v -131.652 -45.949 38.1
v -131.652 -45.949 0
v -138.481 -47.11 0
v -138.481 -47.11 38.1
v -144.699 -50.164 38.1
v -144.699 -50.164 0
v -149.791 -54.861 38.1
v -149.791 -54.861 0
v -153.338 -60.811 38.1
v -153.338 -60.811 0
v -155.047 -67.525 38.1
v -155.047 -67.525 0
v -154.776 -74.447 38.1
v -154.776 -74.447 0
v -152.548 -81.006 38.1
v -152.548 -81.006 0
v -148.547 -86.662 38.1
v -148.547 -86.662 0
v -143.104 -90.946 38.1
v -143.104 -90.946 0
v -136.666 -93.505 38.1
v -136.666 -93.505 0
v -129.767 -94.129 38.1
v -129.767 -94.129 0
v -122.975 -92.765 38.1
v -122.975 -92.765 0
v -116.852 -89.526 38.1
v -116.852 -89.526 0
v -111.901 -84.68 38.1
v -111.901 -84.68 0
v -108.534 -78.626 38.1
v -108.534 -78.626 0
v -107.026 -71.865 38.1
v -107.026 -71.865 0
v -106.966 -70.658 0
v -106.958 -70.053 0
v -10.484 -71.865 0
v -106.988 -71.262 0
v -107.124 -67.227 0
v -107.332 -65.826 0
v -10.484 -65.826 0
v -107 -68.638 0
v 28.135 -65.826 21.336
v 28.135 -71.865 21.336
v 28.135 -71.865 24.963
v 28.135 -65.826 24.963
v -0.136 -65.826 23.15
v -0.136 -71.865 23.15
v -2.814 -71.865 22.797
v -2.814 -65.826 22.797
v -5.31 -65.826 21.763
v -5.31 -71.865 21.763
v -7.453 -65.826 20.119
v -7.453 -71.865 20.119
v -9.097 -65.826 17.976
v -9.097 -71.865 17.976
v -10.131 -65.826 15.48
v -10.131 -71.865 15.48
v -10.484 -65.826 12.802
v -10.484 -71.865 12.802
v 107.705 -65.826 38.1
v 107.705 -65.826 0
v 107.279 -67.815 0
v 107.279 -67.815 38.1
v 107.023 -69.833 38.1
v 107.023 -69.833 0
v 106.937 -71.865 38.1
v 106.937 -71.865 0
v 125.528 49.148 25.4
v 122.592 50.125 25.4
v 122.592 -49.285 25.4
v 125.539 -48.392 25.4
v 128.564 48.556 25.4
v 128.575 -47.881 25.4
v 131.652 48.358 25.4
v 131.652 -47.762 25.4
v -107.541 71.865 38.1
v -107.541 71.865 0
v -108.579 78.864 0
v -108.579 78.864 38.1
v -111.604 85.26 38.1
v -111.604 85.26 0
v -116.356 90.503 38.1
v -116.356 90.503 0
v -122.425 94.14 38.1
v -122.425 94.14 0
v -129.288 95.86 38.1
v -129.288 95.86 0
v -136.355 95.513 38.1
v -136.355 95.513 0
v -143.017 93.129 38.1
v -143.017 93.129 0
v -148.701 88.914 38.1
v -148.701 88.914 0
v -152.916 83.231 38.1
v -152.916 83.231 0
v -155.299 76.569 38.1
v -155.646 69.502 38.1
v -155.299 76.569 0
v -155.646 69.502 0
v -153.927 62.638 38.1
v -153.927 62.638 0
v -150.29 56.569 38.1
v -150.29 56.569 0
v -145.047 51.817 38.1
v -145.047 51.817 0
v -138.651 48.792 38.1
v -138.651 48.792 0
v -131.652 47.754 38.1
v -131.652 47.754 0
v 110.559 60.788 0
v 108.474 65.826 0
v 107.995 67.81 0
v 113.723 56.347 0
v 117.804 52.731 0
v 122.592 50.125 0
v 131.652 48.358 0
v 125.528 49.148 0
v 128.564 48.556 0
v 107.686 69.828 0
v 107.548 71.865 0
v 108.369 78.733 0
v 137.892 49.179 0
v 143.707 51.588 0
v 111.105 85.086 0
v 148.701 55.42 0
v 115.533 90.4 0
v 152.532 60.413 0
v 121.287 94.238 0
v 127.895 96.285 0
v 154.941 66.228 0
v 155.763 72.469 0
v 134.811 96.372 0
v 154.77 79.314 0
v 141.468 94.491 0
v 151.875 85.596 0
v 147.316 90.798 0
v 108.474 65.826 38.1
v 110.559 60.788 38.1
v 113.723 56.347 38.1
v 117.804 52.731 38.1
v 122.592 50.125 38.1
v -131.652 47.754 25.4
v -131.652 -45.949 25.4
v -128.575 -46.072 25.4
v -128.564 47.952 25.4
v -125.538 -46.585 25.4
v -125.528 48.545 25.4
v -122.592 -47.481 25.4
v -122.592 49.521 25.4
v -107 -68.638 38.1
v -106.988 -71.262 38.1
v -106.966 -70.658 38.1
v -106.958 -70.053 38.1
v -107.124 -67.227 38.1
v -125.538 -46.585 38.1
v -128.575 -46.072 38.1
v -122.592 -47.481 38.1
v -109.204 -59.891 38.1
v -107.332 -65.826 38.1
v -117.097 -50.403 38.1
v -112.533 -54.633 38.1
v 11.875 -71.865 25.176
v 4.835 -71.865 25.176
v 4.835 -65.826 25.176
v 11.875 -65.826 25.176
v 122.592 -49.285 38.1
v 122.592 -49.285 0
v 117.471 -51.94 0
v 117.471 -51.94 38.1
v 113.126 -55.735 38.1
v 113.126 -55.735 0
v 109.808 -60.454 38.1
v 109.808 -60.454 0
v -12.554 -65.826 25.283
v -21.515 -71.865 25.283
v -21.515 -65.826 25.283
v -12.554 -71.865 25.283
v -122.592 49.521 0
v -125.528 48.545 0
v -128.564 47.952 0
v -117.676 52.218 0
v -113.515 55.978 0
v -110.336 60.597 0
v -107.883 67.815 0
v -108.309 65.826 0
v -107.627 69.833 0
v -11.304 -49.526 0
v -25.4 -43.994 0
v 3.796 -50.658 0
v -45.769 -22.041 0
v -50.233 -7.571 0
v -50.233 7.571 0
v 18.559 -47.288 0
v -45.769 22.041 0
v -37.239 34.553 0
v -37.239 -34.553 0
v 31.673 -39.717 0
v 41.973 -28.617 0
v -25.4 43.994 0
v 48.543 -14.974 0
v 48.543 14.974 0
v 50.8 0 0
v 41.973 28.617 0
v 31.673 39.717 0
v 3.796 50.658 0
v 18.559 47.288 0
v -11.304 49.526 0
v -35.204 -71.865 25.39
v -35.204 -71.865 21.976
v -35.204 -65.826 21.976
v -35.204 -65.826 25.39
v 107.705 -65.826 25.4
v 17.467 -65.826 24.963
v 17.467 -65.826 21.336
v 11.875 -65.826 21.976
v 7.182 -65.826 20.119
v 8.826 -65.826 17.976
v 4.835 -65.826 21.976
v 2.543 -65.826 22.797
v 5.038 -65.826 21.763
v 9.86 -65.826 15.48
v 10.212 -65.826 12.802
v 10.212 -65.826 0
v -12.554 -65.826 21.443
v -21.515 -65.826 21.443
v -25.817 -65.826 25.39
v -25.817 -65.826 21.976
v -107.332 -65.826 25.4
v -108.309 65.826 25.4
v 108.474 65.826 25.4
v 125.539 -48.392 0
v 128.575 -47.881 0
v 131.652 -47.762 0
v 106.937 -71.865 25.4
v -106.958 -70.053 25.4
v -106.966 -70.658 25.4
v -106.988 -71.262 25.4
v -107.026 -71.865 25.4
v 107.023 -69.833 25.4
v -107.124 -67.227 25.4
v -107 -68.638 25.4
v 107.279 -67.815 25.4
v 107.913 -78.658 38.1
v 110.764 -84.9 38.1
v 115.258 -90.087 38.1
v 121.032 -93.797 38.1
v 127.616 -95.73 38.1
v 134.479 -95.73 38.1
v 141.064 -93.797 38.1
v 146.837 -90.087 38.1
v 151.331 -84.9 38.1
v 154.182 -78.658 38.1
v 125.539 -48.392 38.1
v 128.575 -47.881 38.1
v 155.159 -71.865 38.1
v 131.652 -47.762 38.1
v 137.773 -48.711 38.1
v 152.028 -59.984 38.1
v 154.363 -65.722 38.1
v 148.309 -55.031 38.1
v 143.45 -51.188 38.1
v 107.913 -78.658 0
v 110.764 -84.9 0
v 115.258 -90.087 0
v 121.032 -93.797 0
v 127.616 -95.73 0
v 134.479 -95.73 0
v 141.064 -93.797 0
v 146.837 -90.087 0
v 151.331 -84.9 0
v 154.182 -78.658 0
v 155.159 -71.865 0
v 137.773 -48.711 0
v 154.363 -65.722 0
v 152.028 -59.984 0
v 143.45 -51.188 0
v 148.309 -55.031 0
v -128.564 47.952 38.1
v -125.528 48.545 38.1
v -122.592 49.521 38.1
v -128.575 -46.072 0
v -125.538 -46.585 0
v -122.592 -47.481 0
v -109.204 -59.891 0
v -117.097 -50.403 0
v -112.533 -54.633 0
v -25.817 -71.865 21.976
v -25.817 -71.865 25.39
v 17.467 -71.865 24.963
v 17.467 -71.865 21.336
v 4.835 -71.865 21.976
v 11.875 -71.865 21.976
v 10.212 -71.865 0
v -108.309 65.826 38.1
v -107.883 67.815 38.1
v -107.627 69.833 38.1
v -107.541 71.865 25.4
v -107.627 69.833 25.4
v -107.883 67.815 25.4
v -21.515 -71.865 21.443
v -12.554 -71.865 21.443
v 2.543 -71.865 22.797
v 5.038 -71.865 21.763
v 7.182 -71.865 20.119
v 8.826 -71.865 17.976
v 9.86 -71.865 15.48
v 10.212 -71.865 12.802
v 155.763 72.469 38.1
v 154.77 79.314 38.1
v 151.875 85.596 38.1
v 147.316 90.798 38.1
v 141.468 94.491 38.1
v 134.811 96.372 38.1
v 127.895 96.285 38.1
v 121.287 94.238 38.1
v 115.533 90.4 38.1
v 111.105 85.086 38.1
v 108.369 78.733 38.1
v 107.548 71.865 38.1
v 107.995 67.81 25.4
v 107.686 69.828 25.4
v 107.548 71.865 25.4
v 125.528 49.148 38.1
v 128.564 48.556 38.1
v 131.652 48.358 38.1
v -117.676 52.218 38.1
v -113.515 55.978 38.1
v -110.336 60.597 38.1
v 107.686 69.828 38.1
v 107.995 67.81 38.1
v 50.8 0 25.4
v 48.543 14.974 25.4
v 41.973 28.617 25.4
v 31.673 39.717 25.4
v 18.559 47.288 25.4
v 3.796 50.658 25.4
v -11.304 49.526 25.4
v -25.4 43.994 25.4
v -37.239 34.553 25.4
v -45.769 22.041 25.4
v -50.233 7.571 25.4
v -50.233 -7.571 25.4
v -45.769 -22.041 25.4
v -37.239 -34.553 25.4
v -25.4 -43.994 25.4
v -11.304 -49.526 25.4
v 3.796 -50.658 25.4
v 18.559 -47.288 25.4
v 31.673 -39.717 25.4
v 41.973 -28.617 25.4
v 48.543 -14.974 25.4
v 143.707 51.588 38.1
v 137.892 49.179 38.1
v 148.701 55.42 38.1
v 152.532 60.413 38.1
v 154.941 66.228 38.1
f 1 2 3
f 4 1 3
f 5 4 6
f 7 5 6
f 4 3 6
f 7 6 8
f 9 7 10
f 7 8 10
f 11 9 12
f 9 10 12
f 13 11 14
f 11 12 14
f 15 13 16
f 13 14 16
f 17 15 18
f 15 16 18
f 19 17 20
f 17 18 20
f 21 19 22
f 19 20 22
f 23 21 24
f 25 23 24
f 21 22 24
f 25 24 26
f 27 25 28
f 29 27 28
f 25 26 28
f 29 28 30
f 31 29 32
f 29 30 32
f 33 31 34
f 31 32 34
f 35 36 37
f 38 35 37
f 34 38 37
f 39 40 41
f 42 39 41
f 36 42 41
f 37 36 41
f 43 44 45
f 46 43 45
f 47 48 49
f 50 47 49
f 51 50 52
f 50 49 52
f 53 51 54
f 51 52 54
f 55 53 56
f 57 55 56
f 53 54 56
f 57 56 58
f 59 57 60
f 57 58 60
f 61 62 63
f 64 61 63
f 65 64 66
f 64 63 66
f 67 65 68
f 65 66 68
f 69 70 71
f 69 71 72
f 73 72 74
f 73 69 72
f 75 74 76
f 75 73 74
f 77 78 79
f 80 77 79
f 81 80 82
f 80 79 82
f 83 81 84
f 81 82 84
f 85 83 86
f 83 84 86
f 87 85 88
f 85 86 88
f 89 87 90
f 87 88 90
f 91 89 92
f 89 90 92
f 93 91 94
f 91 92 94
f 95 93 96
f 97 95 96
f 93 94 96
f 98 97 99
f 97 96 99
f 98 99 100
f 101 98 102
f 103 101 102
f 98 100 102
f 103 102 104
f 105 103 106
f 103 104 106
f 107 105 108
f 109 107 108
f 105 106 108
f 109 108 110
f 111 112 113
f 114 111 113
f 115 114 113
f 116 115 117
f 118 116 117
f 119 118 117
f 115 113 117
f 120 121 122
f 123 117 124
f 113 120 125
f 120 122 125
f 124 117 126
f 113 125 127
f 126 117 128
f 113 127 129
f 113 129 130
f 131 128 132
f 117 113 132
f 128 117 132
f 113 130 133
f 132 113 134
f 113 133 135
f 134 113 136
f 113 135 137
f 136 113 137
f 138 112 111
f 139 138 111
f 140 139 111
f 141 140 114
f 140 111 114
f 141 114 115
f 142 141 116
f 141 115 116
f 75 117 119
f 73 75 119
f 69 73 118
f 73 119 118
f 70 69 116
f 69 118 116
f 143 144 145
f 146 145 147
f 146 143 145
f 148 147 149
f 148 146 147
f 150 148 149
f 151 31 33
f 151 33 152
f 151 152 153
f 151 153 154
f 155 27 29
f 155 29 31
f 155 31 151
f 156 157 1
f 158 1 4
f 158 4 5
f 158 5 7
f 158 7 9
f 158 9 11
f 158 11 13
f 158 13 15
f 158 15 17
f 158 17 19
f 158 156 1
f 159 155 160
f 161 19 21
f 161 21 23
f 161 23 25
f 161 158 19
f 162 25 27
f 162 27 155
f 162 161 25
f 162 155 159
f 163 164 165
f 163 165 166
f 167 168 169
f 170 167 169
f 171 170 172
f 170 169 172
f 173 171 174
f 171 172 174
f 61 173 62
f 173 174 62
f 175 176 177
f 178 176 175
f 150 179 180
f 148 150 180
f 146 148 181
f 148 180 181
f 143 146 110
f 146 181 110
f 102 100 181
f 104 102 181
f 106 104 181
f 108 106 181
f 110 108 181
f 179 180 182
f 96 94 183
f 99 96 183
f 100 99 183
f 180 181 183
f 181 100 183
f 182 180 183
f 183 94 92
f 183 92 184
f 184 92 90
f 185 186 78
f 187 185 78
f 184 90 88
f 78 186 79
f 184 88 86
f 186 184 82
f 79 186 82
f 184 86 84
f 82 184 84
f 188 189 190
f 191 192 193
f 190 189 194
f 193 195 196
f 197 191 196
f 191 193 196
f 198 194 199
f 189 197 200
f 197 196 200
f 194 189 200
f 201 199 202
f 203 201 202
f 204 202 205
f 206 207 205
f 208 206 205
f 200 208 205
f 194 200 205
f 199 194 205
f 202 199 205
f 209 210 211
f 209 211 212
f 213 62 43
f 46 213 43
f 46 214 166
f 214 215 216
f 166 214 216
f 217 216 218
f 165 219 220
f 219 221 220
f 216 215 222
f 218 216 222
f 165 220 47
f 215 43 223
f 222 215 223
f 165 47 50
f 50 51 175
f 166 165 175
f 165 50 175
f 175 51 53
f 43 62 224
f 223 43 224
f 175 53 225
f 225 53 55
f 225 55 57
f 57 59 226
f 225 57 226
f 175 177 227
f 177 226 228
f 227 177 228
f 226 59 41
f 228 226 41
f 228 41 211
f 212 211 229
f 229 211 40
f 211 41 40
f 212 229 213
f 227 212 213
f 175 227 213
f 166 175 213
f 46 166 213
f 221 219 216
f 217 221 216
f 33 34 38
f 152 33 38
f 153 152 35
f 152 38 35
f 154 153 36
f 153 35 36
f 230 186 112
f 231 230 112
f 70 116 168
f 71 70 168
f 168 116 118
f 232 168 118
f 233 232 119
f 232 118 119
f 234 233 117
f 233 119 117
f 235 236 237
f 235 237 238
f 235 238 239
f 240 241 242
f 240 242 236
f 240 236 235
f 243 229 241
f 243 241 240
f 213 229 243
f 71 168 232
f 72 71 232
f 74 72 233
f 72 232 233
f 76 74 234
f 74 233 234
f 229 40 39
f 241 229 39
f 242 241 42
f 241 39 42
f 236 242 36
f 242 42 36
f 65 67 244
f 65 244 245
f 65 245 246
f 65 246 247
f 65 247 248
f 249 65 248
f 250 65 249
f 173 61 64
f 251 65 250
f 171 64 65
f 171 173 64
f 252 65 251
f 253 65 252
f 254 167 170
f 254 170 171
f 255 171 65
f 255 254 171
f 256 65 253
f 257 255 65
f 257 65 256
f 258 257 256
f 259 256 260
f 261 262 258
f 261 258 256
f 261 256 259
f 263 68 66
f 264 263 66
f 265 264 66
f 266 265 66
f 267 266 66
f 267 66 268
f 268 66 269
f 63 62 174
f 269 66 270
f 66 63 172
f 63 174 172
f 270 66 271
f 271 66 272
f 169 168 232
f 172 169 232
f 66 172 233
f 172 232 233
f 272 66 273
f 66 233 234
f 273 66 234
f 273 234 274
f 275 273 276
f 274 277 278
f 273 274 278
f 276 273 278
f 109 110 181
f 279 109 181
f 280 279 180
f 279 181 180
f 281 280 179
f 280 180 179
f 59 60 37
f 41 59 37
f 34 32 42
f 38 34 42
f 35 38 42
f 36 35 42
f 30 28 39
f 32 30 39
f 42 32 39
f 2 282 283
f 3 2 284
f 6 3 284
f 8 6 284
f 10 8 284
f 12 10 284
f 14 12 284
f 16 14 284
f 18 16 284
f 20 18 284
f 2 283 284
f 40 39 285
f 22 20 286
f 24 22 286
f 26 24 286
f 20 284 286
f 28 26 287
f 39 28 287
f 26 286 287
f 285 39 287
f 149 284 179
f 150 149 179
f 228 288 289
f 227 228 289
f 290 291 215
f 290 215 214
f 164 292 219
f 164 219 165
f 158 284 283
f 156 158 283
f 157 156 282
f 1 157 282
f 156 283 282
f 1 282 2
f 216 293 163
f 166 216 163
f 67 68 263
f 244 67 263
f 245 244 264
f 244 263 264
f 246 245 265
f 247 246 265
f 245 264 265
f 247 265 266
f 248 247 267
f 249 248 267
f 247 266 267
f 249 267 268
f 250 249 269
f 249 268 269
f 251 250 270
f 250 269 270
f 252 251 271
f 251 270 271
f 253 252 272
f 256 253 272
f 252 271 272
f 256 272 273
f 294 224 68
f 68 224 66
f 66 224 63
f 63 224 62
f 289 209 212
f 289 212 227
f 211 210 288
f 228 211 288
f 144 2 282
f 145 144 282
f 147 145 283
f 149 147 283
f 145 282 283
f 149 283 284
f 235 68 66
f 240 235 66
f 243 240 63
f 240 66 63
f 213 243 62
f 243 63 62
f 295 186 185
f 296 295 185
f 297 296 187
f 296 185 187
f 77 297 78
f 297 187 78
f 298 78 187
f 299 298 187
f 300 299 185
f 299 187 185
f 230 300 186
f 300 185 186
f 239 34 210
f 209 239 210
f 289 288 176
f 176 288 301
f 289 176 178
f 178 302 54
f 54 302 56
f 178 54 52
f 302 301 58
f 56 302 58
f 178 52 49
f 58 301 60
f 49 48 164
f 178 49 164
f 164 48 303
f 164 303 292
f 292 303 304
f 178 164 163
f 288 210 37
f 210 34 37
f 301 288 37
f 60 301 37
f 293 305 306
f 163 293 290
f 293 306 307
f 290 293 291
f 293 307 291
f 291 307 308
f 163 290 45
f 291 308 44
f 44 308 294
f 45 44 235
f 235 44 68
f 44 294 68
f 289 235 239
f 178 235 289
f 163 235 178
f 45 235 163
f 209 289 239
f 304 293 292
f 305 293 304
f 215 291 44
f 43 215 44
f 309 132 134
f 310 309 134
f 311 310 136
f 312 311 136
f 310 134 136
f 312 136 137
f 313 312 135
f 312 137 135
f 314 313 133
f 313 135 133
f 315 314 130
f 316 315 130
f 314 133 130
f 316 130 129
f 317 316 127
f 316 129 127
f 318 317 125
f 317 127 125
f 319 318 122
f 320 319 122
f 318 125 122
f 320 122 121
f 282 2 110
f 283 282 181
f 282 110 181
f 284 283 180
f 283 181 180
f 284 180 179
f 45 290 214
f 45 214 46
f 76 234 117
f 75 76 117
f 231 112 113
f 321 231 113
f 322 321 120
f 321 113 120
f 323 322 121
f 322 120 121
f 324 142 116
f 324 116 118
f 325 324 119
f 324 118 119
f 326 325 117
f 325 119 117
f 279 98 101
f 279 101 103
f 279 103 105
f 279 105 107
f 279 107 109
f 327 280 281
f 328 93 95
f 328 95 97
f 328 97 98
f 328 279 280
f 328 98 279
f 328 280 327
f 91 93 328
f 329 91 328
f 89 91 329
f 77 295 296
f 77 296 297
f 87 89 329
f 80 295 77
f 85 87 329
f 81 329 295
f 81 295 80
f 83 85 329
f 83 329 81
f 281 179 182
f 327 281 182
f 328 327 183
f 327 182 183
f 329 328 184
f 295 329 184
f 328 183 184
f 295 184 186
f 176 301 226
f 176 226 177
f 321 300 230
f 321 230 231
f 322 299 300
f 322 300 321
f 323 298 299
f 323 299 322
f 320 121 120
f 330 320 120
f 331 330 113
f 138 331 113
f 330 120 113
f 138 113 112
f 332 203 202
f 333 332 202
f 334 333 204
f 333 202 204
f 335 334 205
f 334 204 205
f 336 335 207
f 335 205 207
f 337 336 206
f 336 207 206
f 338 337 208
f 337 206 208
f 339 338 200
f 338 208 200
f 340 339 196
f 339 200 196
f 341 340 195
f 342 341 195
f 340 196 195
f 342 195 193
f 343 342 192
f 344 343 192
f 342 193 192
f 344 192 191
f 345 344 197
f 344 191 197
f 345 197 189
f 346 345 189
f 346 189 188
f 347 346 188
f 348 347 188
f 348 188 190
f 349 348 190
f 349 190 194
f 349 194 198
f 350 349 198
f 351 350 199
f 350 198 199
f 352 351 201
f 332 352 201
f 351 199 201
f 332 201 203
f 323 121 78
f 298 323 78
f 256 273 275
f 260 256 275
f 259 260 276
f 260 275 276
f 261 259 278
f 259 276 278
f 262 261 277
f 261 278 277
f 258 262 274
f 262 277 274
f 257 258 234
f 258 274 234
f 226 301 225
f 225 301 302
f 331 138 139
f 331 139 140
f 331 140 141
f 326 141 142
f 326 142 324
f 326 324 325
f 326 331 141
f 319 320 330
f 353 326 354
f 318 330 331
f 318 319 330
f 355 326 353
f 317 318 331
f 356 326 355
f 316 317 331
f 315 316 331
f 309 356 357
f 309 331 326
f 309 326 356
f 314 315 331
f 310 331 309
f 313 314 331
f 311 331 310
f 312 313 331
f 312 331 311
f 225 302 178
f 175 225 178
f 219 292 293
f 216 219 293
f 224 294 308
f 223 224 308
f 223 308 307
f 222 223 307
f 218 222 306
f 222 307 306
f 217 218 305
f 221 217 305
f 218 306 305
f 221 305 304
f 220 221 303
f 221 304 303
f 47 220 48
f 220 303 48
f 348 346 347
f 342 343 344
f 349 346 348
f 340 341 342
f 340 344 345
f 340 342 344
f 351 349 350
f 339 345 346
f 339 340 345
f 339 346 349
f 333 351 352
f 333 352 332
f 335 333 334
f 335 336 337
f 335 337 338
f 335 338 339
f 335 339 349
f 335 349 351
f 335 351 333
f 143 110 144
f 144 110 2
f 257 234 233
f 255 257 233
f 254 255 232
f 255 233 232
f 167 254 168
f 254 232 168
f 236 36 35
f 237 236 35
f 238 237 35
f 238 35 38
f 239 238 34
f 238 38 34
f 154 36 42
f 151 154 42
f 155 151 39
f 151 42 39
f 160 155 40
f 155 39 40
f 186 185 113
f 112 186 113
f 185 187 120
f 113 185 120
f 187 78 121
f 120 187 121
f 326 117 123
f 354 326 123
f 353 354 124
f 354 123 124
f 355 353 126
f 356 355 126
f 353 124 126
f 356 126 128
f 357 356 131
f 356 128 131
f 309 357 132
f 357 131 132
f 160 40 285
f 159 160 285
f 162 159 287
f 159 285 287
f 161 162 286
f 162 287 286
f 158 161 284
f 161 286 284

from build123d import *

# Parameters (mm, degrees)
F1_DEPTH = 25.4
F2_DEPTH = 38.1
F4_DEPTH = 25.4
F5_W     = 9.387843
F5_H     = 3.413763
F5_W_2   = 10.668003
F5_H_2   = 3.627116
F6_DEPTH = 25.4
F7_W     = 8.961123
F7_H     = 3.84048
F7_W_2   = 7.040878
F7_H_2   = 3.2004
F8_DEPTH = 25.4
F0_R     = 50.8
F9_DEPTH = 25.4


with BuildPart() as f1:
    # F0 (on Top) → F1 (new body)
    with BuildSketch(Plane.XY):
        with BuildLine():
            ThreePointArc((108.473918, 65.825826), (107.81905, 68.815923), (107.548297, 71.864894))
            Line((107.548297, 71.864894), (-107.540722, 71.864894))
            ThreePointArc((-107.540722, 71.864894), (-107.733632, 68.821006), (-108.309275, 65.825826))
            Line((-108.309275, 65.825826), (108.473918, 65.825826))
        make_face()
        with BuildLine():
            ThreePointArc((-122.592313, 49.520655), (-127.03665, 48.199766), (-131.651642, 47.753974))
            Line((-131.651642, 47.753974), (-131.651642, -45.949293))
            ThreePointArc((-131.651642, -45.949293), (-127.048321, -46.279844), (-122.592313, -47.481437))
            Line((-122.592313, -47.481437), (-122.592313, 49.520655))
        make_face()
        with BuildLine():
            ThreePointArc((-106.958024, -70.053171), (-106.975071, -70.959673), (-107.026188, -71.864894))
            Line((-107.026188, -71.864894), (106.936778, -71.864894))
            ThreePointArc((106.936778, -71.864894), (107.129688, -68.821006), (107.70533, -65.825826))
            Line((107.70533, -65.825826), (-107.331505, -65.825826))
            ThreePointArc((-107.331505, -65.825826), (-107.051576, -67.931265), (-106.958024, -70.053171))
        make_face()
        with BuildLine():
            Line((131.651642, -47.76154), (131.651642, 48.357877))
            ThreePointArc((131.651642, 48.357877), (127.03665, 48.80367), (122.592313, 50.124562))
            Line((122.592313, 50.124562), (122.592313, -49.285192))
            ThreePointArc((122.592313, -49.285192), (127.048741, -48.087914), (131.651642, -47.76154))
        make_face()
    extrude(amount=F1_DEPTH)

    # F3 (on face) → F4 (cut)
    with BuildSketch(Plane.XZ.offset(71.864894)):
        with BuildLine():
            Line((-10.483552, 12.8016), (-10.483552, 0))
            Line((-10.483552, 0), (10.212369, 0))
            Line((10.212369, 0), (10.212369, 12.8016))
            ThreePointArc((10.212369, 12.8016), (7.181522, 20.118713), (-0.135591, 23.14956))
            ThreePointArc((-0.135591, 23.14956), (-7.452704, 20.118713), (-10.483552, 12.8016))
        make_face()
    extrude(amount=-F4_DEPTH, mode=Mode.SUBTRACT)

    # F5 (on face) → F6 (cut)
    with BuildSketch(Plane.XZ.offset(71.864894)):
        with Locations((-30.510481, 23.682961)):
            Rectangle(F5_W, F5_H)
        with Locations((22.80061, 23.14956)):
            Rectangle(F5_W_2, F5_H_2)
    extrude(amount=-F6_DEPTH, mode=Mode.SUBTRACT)

    # F7 (on face) → F8 (cut)
    with BuildSketch(Plane.XZ.offset(71.864894)):
        with Locations((-17.034854, 23.36292)):
            Rectangle(F7_W, F7_H)
        with Locations((8.354986, 23.57628)):
            Rectangle(F7_W_2, F7_H_2)
    extrude(amount=-F8_DEPTH, mode=Mode.SUBTRACT)


with BuildPart() as f2:
    # F0 (on Top) → F2 (new body)
    with BuildSketch(Plane.XY):
        with BuildLine():
            ThreePointArc((-108.309275, 65.825826), (-107.733632, 68.821006), (-107.540722, 71.864894))
            ThreePointArc((-107.540722, 71.864894), (-148.700637, 88.913889), (-131.651642, 47.753974))
            ThreePointArc((-131.651642, 47.753974), (-127.03665, 48.199766), (-122.592313, 49.520655))
            ThreePointArc((-122.592313, 49.520655), (-113.515156, 55.977657), (-108.309275, 65.825826))
        make_face()
        with BuildLine():
            ThreePointArc((155.762572, 72.468797), (131.349678, 96.577825), (107.548297, 71.864894))
            ThreePointArc((107.548297, 71.864894), (107.81905, 68.815923), (108.473918, 65.825826))
            ThreePointArc((108.473918, 65.825826), (113.722914, 56.347482), (122.592313, 50.124562))
            ThreePointArc((122.592313, 50.124562), (127.03665, 48.80367), (131.651642, 48.357877))
            ThreePointArc((131.651642, 48.357877), (148.700644, 55.419798), (155.762572, 72.468797))
        make_face()
        with BuildLine():
            ThreePointArc((-122.592313, -47.481437), (-127.048321, -46.279844), (-131.651642, -45.949293))
            ThreePointArc((-131.651642, -45.949293), (-148.54745, -86.66155), (-107.026188, -71.864894))
            ThreePointArc((-107.026188, -71.864894), (-106.975071, -70.959673), (-106.958024, -70.053171))
            ThreePointArc((-106.958024, -70.053171), (-107.051576, -67.931265), (-107.331505, -65.825826))
            ThreePointArc((-107.331505, -65.825826), (-112.533418, -54.633355), (-122.592313, -47.481437))
        make_face()
        with BuildLine():
            ThreePointArc((155.158617, -71.864894), (148.308898, -55.03078), (131.651642, -47.76154))
            ThreePointArc((131.651642, -47.76154), (127.048741, -48.087914), (122.592313, -49.285192))
            ThreePointArc((122.592313, -49.285192), (113.126414, -55.735292), (107.70533, -65.825826))
            ThreePointArc((107.70533, -65.825826), (107.129688, -68.821006), (106.936778, -71.864894))
            ThreePointArc((106.936778, -71.864894), (131.047697, -95.975814), (155.158617, -71.864894))
        make_face()
    extrude(amount=F2_DEPTH)


with BuildPart() as f9:
    # F0 (on Top) → F9 (new body)
    with BuildSketch(Plane.XY):
        Circle(F0_R)
    extrude(amount=F9_DEPTH)


solid = Compound([f1.part, f2.part, f9.part])
